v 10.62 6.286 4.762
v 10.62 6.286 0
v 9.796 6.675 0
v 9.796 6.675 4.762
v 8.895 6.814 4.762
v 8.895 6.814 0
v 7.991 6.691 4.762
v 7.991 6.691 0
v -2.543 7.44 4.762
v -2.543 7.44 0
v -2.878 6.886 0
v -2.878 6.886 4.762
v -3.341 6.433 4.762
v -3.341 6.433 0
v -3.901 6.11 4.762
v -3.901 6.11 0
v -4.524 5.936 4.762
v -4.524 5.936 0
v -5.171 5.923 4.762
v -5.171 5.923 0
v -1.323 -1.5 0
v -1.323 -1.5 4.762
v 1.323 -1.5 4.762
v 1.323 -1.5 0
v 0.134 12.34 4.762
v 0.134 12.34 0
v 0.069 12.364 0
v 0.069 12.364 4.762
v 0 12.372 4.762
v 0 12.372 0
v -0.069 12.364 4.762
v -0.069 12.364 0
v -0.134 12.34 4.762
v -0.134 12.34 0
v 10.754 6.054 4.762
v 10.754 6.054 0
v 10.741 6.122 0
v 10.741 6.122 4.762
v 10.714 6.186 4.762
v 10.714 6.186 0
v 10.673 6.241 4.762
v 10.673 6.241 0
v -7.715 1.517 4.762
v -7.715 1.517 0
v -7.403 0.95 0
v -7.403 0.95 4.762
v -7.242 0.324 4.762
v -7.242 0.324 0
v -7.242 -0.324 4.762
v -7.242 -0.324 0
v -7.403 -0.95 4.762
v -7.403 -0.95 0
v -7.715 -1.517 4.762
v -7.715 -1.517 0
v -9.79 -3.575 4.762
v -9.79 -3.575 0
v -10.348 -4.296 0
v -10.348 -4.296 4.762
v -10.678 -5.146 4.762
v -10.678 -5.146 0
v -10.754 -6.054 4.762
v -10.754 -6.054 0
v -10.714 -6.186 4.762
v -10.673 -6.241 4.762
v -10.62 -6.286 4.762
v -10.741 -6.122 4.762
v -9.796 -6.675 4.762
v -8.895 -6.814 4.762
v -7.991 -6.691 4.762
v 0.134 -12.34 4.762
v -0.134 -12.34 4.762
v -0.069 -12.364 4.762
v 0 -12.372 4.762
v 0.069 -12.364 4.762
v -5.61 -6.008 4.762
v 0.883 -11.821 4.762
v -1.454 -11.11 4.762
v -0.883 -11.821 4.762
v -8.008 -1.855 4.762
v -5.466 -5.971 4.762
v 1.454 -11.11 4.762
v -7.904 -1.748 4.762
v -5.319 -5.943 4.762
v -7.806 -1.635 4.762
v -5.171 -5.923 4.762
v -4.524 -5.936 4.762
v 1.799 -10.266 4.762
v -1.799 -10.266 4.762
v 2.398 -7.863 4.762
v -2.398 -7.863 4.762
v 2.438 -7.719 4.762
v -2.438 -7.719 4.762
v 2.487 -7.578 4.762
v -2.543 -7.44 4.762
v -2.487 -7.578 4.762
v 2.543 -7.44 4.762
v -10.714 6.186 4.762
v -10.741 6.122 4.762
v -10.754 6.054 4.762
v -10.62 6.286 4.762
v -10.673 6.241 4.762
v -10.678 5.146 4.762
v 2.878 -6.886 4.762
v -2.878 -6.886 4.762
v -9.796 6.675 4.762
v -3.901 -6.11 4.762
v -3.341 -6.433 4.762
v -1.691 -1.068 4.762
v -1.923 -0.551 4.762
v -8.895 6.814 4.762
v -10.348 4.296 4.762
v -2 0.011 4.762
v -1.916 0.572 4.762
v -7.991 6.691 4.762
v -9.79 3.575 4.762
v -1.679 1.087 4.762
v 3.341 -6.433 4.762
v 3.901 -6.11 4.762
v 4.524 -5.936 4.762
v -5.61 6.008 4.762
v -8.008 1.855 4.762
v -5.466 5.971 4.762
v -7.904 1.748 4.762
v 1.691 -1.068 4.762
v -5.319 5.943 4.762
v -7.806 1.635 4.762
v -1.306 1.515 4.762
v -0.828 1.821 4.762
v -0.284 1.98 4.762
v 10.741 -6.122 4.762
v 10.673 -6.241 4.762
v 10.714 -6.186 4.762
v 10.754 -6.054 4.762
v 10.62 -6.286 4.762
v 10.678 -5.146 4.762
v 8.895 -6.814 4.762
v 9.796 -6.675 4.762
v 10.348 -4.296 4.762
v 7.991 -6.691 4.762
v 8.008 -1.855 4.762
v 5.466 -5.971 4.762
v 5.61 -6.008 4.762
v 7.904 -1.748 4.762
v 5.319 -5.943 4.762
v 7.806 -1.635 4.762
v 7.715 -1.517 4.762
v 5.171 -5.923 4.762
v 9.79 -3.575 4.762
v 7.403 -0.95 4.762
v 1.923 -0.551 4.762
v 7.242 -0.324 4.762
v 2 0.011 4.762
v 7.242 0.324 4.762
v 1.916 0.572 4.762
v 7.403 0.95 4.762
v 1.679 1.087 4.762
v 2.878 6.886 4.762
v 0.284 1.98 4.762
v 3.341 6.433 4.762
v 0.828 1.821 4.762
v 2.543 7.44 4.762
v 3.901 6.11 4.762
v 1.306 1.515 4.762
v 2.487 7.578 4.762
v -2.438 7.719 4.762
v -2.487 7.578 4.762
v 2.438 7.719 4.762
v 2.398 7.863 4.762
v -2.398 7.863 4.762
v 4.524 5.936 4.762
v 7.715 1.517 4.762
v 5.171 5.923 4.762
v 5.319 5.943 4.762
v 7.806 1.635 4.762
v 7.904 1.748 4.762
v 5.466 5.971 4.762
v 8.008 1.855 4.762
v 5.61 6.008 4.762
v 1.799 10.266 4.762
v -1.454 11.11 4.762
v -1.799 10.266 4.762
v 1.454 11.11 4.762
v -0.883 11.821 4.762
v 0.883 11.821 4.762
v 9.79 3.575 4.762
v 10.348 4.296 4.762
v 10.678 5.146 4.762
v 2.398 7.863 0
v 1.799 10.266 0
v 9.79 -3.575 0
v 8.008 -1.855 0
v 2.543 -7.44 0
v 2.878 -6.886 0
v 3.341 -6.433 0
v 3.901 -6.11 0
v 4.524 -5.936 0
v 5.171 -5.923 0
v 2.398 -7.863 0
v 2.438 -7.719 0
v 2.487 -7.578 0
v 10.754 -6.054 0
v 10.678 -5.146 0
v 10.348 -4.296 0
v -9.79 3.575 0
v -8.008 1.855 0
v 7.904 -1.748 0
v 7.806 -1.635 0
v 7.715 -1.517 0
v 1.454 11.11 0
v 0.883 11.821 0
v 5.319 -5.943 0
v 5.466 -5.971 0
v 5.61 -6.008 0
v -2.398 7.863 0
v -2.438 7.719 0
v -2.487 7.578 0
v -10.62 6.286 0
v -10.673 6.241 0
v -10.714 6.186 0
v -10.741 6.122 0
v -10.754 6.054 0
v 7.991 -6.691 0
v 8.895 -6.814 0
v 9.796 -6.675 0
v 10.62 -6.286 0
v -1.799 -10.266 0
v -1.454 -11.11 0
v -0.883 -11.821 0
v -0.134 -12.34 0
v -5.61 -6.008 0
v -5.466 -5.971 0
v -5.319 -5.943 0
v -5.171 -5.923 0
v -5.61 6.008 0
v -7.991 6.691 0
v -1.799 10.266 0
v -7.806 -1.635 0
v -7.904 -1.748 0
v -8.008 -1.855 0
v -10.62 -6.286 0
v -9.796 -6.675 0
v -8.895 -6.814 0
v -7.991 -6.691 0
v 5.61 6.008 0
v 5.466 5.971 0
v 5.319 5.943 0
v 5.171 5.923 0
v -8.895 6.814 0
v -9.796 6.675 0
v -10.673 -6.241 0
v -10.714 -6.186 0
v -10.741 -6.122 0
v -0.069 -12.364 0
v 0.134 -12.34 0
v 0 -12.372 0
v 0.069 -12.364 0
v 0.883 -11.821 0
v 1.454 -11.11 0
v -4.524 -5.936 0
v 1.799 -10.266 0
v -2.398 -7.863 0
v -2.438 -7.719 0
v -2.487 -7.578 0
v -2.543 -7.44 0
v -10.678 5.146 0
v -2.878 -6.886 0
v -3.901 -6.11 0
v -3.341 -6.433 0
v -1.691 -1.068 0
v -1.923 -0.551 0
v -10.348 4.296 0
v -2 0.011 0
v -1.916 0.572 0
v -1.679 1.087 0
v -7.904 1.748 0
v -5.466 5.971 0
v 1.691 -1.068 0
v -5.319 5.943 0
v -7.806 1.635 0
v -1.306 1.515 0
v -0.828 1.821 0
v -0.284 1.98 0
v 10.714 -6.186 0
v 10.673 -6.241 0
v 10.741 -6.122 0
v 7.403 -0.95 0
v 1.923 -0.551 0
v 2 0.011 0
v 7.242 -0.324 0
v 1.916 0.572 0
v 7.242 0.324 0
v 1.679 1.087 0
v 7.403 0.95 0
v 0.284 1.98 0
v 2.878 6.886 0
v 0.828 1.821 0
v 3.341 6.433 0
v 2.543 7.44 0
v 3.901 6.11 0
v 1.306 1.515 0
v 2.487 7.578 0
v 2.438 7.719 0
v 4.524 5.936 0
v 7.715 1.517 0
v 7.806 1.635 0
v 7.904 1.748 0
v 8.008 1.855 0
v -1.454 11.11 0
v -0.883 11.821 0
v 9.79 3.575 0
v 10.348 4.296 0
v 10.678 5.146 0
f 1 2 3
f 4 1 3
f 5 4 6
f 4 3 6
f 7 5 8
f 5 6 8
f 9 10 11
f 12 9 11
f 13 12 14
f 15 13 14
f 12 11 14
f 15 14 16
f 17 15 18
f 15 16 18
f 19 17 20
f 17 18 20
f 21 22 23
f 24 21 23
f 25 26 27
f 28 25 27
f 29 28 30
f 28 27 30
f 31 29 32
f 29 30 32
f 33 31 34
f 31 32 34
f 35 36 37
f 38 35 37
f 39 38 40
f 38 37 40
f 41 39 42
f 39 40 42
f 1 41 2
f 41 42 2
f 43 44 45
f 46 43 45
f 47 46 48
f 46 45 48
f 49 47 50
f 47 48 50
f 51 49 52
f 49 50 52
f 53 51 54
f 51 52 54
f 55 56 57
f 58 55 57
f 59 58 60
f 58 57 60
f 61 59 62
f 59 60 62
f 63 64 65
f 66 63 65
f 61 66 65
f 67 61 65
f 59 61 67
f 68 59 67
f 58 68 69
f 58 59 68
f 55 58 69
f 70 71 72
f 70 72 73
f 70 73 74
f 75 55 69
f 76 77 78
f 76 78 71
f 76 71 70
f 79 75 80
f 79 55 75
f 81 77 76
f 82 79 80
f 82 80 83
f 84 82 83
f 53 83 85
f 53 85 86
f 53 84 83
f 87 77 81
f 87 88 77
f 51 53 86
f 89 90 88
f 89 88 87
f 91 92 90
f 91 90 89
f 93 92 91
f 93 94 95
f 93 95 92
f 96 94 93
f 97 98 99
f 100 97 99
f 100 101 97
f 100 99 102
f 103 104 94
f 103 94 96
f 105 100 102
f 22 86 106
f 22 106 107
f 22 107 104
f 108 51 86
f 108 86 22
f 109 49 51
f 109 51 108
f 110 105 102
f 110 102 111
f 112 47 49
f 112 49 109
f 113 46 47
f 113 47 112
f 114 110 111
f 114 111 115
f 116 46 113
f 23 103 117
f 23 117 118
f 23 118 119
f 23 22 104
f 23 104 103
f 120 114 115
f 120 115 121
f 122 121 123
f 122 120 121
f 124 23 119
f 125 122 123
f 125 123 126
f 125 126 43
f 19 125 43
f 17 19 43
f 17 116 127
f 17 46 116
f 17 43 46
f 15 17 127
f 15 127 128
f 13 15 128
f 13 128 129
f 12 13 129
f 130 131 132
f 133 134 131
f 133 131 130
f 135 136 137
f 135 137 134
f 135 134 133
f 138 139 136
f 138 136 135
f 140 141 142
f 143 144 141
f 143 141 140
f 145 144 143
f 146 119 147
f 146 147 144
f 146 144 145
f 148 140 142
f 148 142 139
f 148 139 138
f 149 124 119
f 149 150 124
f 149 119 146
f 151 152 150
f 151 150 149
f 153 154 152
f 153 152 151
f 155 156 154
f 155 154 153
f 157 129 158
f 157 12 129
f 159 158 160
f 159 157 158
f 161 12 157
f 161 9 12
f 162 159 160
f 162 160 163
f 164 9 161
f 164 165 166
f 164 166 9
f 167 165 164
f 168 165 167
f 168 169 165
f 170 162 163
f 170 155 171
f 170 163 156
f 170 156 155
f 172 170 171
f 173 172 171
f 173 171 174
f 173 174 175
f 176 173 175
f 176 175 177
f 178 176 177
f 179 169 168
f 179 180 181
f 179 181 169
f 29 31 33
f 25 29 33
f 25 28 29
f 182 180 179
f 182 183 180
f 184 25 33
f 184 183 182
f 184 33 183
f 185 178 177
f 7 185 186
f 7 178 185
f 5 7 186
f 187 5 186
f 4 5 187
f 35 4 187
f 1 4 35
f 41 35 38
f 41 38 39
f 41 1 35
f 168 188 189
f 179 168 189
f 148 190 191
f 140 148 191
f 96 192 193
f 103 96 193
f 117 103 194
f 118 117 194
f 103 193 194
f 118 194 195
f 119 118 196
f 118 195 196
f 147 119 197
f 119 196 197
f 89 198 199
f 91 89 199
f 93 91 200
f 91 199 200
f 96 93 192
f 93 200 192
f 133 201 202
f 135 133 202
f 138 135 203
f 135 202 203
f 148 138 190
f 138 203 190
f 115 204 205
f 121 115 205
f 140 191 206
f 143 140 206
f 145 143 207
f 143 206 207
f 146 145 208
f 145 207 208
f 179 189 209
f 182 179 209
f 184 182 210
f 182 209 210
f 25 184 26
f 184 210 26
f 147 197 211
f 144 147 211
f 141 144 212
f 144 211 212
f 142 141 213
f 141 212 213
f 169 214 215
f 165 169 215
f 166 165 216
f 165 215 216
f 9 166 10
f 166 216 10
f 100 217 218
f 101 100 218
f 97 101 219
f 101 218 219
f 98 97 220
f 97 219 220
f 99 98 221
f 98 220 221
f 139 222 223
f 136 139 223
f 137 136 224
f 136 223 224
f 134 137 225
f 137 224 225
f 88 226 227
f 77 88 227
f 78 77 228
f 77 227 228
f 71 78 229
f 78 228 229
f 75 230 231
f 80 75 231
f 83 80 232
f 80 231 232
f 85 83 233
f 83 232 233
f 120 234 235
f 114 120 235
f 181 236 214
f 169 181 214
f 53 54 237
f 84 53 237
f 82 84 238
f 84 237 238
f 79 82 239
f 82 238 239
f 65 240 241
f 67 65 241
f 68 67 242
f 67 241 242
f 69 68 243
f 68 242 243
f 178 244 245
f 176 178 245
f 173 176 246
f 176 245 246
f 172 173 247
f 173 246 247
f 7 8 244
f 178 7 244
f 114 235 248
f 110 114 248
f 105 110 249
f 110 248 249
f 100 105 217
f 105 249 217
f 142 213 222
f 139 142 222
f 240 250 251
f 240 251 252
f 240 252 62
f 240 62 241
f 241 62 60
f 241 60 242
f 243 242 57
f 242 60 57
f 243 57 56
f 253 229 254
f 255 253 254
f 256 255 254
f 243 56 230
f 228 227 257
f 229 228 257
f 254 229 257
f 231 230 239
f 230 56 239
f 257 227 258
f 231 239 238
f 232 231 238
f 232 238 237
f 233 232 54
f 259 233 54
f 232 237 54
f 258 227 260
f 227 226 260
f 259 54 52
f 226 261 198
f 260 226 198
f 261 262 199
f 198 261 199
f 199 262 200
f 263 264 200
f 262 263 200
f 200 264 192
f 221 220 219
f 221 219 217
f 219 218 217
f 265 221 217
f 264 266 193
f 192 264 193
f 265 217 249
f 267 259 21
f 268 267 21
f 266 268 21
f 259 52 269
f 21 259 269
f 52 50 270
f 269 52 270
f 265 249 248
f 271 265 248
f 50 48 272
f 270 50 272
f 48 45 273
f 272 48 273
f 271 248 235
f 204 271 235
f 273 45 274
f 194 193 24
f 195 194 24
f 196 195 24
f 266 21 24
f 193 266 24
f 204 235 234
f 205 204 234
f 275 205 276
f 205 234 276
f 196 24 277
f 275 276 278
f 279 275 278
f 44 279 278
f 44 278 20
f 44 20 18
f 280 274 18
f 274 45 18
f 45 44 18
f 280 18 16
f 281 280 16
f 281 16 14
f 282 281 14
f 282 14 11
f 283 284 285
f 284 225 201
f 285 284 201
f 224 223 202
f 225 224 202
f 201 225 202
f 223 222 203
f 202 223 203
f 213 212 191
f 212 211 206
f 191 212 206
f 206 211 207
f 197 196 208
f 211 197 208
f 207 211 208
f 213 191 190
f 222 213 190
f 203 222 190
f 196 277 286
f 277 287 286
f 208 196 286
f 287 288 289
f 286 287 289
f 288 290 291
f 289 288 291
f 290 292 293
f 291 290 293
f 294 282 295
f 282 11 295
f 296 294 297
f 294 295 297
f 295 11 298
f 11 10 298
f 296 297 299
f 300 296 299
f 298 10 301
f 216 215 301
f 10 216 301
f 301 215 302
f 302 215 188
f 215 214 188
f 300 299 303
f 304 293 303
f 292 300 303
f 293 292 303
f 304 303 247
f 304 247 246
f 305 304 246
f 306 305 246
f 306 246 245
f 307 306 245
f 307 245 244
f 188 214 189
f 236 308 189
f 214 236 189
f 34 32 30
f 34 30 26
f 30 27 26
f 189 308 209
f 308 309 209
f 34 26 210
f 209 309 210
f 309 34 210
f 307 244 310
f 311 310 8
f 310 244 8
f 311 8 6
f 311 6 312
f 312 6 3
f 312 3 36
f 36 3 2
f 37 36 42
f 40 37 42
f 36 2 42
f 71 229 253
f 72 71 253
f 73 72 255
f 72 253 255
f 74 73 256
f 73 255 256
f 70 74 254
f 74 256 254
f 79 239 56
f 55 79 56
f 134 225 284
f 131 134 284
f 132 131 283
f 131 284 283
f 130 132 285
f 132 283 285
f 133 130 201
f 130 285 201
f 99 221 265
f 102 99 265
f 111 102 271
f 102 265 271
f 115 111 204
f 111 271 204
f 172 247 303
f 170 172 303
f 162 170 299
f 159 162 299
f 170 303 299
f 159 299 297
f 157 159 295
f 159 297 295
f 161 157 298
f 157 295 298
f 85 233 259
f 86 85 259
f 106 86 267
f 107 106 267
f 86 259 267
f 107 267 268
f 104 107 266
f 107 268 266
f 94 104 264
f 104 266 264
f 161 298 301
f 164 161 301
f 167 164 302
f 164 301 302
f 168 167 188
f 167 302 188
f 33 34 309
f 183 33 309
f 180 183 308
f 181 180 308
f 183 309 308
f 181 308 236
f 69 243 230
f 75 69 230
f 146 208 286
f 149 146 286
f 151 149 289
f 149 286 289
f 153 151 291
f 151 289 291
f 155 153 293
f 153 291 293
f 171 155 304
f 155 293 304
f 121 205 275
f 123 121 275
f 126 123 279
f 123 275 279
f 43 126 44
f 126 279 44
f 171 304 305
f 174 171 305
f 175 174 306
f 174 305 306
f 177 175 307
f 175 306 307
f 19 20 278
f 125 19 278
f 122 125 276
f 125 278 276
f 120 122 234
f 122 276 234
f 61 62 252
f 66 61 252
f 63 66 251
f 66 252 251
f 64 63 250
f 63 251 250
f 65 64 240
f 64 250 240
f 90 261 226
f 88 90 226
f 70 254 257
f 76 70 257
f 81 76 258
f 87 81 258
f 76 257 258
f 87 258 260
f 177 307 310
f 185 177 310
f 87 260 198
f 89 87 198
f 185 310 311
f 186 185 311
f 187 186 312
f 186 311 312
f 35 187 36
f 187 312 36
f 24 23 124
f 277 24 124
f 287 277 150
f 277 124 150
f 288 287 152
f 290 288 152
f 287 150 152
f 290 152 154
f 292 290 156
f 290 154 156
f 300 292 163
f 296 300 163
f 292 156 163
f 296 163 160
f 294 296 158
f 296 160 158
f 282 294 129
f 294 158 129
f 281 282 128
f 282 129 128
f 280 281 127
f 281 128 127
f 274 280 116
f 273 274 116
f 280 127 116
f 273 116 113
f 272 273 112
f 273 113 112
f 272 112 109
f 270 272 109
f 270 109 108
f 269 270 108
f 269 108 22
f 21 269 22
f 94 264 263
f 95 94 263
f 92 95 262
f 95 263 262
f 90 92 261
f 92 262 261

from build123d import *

# Parameters (mm, degrees)
BOSS_EXTRUDE1_DEPTH = 4.7625
CUT_EXTRUDE1_DEPTH  = 4.7625


with BuildPart() as part:
    # Sketch1 → Boss-Extrude1 (new body)
    with BuildSketch(Plane.XY):
        with BuildLine():
            ThreePointArc((0.13375119, -12.340042072), (1.193950707, -11.485860744), (1.798906697, -10.266157088))
            Line((1.798906697, -10.266157088), (2.398140588, -7.862761221))
            ThreePointArc((2.398140588, -7.862761221), (2.461635419, -7.64822635), (2.543491476, -7.440004377))
            ThreePointArc((2.543491476, -7.440004377), (3.61061, -6.253759966), (5.171487057, -5.922730421))
            ThreePointArc((5.171487057, -5.922730421), (5.392740604, -5.955951983), (5.610280667, -6.008231282))
            Line((5.610280667, -6.008231282), (7.991299489, -6.690977442))
            ThreePointArc((7.991299489, -6.690977442), (9.350071835, -6.776922016), (10.619914323, -6.285852964))
            ThreePointArc((10.619914323, -6.285852964), (10.714040096, -6.185753934), (10.753665513, -6.054189108))
            ThreePointArc((10.753665513, -6.054189108), (10.544022542, -4.708938729), (9.790206185, -3.575179646))
            Line((9.790206185, -3.575179646), (8.008421255, -1.854529939))
            ThreePointArc((8.008421255, -1.854529939), (7.854376023, -1.692274367), (7.714978533, -1.517273956))
            ThreePointArc((7.714978533, -1.517273956), (7.22122, 0), (7.714978533, 1.517273956))
            ThreePointArc((7.714978533, 1.517273956), (7.854376023, 1.692274367), (8.008421255, 1.854529939))
            Line((8.008421255, 1.854529939), (9.790205754, 3.575179229))
            ThreePointArc((9.790205754, 3.575179229), (10.544022434, 4.708938449), (10.753665513, 6.054189108))
            ThreePointArc((10.753665513, 6.054189108), (10.714040096, 6.185753934), (10.619914323, 6.285852964))
            ThreePointArc((10.619914323, 6.285852964), (9.350071835, 6.776922015), (7.991299489, 6.690977442))
            Line((7.991299489, 6.690977442), (5.610280667, 6.008231282))
            ThreePointArc((5.610280667, 6.008231282), (5.392740604, 5.955951983), (5.171487057, 5.922730421))
            ThreePointArc((5.171487057, 5.922730421), (3.61061, 6.253759966), (2.543491476, 7.440004377))
            ThreePointArc((2.543491476, 7.440004377), (2.461635419, 7.64822635), (2.398140588, 7.862761221))
            Line((2.398140588, 7.862761221), (1.798906697, 10.266157088))
            ThreePointArc((1.798906697, 10.266157088), (1.193950707, 11.485860744), (0.13375119, 12.340042072))
            ThreePointArc((0.13375119, 12.340042072), (0, 12.371507867), (-0.13375119, 12.340042072))
            ThreePointArc((-0.13375119, 12.340042072), (-1.193950707, 11.485860744), (-1.798906697, 10.266157088))
            Line((-1.798906697, 10.266157088), (-2.398140588, 7.862761221))
            ThreePointArc((-2.398140588, 7.862761221), (-2.461635419, 7.64822635), (-2.543491476, 7.440004377))
            ThreePointArc((-2.543491476, 7.440004377), (-3.61061, 6.253759966), (-5.171487057, 5.922730421))
            ThreePointArc((-5.171487057, 5.922730421), (-5.392740604, 5.955951983), (-5.610280667, 6.008231282))
            Line((-5.610280667, 6.008231282), (-7.991299489, 6.690977442))
            ThreePointArc((-7.991299489, 6.690977442), (-9.350071835, 6.776922016), (-10.619914323, 6.285852964))
            ThreePointArc((-10.619914323, 6.285852964), (-10.714040096, 6.185753934), (-10.753665513, 6.054189108))
            ThreePointArc((-10.753665513, 6.054189108), (-10.544022542, 4.708938729), (-9.790206185, 3.575179646))
            Line((-9.790206185, 3.575179646), (-8.008421255, 1.854529939))
            ThreePointArc((-8.008421255, 1.854529939), (-7.854376023, 1.692274367), (-7.714978533, 1.517273956))
            ThreePointArc((-7.714978533, 1.517273956), (-7.22122, 0), (-7.714978533, -1.517273956))
            ThreePointArc((-7.714978533, -1.517273956), (-7.854376023, -1.692274367), (-8.008421255, -1.854529939))
            Line((-8.008421255, -1.854529939), (-9.790205754, -3.575179229))
            ThreePointArc((-9.790205754, -3.575179229), (-10.544022434, -4.708938449), (-10.753665513, -6.054189108))
            ThreePointArc((-10.753665513, -6.054189108), (-10.714040096, -6.185753934), (-10.619914323, -6.285852964))
            ThreePointArc((-10.619914323, -6.285852964), (-9.350071835, -6.776922015), (-7.991299489, -6.690977442))
            Line((-7.991299489, -6.690977442), (-5.610280667, -6.008231282))
            ThreePointArc((-5.610280667, -6.008231282), (-5.392740604, -5.955951983), (-5.171487057, -5.922730421))
            ThreePointArc((-5.171487057, -5.922730421), (-3.61061, -6.253759966), (-2.543491476, -7.440004377))
            ThreePointArc((-2.543491476, -7.440004377), (-2.461635419, -7.64822635), (-2.398140588, -7.862761221))
            Line((-2.398140588, -7.862761221), (-1.798906697, -10.266157088))
            ThreePointArc((-1.798906697, -10.266157088), (-1.193950707, -11.485860744), (-0.13375119, -12.340042072))
            ThreePointArc((-0.13375119, -12.340042072), (0, -12.371507867), (0.13375119, -12.340042072))
        make_face()
        with BuildLine():
            Line((1.313392554, -1.475), (-1.313392554, -1.475))
            ThreePointArc((-1.313392554, -1.475), (0, 1.975), (1.313392554, -1.475))
        make_face(mode=Mode.SUBTRACT)
    extrude(amount=BOSS_EXTRUDE1_DEPTH)

    # Sketch2 → Cut-Extrude1 (cut)
    with BuildSketch(Plane.XY.offset(4.7625)):
        with BuildLine():
            Line((-1.322875656, -1.5), (1.322875656, -1.5))
            ThreePointArc((1.322875656, -1.5), (0, 2), (-1.322875656, -1.5))
        make_face()
    extrude(amount=-CUT_EXTRUDE1_DEPTH, mode=Mode.SUBTRACT)


solid = part.part
